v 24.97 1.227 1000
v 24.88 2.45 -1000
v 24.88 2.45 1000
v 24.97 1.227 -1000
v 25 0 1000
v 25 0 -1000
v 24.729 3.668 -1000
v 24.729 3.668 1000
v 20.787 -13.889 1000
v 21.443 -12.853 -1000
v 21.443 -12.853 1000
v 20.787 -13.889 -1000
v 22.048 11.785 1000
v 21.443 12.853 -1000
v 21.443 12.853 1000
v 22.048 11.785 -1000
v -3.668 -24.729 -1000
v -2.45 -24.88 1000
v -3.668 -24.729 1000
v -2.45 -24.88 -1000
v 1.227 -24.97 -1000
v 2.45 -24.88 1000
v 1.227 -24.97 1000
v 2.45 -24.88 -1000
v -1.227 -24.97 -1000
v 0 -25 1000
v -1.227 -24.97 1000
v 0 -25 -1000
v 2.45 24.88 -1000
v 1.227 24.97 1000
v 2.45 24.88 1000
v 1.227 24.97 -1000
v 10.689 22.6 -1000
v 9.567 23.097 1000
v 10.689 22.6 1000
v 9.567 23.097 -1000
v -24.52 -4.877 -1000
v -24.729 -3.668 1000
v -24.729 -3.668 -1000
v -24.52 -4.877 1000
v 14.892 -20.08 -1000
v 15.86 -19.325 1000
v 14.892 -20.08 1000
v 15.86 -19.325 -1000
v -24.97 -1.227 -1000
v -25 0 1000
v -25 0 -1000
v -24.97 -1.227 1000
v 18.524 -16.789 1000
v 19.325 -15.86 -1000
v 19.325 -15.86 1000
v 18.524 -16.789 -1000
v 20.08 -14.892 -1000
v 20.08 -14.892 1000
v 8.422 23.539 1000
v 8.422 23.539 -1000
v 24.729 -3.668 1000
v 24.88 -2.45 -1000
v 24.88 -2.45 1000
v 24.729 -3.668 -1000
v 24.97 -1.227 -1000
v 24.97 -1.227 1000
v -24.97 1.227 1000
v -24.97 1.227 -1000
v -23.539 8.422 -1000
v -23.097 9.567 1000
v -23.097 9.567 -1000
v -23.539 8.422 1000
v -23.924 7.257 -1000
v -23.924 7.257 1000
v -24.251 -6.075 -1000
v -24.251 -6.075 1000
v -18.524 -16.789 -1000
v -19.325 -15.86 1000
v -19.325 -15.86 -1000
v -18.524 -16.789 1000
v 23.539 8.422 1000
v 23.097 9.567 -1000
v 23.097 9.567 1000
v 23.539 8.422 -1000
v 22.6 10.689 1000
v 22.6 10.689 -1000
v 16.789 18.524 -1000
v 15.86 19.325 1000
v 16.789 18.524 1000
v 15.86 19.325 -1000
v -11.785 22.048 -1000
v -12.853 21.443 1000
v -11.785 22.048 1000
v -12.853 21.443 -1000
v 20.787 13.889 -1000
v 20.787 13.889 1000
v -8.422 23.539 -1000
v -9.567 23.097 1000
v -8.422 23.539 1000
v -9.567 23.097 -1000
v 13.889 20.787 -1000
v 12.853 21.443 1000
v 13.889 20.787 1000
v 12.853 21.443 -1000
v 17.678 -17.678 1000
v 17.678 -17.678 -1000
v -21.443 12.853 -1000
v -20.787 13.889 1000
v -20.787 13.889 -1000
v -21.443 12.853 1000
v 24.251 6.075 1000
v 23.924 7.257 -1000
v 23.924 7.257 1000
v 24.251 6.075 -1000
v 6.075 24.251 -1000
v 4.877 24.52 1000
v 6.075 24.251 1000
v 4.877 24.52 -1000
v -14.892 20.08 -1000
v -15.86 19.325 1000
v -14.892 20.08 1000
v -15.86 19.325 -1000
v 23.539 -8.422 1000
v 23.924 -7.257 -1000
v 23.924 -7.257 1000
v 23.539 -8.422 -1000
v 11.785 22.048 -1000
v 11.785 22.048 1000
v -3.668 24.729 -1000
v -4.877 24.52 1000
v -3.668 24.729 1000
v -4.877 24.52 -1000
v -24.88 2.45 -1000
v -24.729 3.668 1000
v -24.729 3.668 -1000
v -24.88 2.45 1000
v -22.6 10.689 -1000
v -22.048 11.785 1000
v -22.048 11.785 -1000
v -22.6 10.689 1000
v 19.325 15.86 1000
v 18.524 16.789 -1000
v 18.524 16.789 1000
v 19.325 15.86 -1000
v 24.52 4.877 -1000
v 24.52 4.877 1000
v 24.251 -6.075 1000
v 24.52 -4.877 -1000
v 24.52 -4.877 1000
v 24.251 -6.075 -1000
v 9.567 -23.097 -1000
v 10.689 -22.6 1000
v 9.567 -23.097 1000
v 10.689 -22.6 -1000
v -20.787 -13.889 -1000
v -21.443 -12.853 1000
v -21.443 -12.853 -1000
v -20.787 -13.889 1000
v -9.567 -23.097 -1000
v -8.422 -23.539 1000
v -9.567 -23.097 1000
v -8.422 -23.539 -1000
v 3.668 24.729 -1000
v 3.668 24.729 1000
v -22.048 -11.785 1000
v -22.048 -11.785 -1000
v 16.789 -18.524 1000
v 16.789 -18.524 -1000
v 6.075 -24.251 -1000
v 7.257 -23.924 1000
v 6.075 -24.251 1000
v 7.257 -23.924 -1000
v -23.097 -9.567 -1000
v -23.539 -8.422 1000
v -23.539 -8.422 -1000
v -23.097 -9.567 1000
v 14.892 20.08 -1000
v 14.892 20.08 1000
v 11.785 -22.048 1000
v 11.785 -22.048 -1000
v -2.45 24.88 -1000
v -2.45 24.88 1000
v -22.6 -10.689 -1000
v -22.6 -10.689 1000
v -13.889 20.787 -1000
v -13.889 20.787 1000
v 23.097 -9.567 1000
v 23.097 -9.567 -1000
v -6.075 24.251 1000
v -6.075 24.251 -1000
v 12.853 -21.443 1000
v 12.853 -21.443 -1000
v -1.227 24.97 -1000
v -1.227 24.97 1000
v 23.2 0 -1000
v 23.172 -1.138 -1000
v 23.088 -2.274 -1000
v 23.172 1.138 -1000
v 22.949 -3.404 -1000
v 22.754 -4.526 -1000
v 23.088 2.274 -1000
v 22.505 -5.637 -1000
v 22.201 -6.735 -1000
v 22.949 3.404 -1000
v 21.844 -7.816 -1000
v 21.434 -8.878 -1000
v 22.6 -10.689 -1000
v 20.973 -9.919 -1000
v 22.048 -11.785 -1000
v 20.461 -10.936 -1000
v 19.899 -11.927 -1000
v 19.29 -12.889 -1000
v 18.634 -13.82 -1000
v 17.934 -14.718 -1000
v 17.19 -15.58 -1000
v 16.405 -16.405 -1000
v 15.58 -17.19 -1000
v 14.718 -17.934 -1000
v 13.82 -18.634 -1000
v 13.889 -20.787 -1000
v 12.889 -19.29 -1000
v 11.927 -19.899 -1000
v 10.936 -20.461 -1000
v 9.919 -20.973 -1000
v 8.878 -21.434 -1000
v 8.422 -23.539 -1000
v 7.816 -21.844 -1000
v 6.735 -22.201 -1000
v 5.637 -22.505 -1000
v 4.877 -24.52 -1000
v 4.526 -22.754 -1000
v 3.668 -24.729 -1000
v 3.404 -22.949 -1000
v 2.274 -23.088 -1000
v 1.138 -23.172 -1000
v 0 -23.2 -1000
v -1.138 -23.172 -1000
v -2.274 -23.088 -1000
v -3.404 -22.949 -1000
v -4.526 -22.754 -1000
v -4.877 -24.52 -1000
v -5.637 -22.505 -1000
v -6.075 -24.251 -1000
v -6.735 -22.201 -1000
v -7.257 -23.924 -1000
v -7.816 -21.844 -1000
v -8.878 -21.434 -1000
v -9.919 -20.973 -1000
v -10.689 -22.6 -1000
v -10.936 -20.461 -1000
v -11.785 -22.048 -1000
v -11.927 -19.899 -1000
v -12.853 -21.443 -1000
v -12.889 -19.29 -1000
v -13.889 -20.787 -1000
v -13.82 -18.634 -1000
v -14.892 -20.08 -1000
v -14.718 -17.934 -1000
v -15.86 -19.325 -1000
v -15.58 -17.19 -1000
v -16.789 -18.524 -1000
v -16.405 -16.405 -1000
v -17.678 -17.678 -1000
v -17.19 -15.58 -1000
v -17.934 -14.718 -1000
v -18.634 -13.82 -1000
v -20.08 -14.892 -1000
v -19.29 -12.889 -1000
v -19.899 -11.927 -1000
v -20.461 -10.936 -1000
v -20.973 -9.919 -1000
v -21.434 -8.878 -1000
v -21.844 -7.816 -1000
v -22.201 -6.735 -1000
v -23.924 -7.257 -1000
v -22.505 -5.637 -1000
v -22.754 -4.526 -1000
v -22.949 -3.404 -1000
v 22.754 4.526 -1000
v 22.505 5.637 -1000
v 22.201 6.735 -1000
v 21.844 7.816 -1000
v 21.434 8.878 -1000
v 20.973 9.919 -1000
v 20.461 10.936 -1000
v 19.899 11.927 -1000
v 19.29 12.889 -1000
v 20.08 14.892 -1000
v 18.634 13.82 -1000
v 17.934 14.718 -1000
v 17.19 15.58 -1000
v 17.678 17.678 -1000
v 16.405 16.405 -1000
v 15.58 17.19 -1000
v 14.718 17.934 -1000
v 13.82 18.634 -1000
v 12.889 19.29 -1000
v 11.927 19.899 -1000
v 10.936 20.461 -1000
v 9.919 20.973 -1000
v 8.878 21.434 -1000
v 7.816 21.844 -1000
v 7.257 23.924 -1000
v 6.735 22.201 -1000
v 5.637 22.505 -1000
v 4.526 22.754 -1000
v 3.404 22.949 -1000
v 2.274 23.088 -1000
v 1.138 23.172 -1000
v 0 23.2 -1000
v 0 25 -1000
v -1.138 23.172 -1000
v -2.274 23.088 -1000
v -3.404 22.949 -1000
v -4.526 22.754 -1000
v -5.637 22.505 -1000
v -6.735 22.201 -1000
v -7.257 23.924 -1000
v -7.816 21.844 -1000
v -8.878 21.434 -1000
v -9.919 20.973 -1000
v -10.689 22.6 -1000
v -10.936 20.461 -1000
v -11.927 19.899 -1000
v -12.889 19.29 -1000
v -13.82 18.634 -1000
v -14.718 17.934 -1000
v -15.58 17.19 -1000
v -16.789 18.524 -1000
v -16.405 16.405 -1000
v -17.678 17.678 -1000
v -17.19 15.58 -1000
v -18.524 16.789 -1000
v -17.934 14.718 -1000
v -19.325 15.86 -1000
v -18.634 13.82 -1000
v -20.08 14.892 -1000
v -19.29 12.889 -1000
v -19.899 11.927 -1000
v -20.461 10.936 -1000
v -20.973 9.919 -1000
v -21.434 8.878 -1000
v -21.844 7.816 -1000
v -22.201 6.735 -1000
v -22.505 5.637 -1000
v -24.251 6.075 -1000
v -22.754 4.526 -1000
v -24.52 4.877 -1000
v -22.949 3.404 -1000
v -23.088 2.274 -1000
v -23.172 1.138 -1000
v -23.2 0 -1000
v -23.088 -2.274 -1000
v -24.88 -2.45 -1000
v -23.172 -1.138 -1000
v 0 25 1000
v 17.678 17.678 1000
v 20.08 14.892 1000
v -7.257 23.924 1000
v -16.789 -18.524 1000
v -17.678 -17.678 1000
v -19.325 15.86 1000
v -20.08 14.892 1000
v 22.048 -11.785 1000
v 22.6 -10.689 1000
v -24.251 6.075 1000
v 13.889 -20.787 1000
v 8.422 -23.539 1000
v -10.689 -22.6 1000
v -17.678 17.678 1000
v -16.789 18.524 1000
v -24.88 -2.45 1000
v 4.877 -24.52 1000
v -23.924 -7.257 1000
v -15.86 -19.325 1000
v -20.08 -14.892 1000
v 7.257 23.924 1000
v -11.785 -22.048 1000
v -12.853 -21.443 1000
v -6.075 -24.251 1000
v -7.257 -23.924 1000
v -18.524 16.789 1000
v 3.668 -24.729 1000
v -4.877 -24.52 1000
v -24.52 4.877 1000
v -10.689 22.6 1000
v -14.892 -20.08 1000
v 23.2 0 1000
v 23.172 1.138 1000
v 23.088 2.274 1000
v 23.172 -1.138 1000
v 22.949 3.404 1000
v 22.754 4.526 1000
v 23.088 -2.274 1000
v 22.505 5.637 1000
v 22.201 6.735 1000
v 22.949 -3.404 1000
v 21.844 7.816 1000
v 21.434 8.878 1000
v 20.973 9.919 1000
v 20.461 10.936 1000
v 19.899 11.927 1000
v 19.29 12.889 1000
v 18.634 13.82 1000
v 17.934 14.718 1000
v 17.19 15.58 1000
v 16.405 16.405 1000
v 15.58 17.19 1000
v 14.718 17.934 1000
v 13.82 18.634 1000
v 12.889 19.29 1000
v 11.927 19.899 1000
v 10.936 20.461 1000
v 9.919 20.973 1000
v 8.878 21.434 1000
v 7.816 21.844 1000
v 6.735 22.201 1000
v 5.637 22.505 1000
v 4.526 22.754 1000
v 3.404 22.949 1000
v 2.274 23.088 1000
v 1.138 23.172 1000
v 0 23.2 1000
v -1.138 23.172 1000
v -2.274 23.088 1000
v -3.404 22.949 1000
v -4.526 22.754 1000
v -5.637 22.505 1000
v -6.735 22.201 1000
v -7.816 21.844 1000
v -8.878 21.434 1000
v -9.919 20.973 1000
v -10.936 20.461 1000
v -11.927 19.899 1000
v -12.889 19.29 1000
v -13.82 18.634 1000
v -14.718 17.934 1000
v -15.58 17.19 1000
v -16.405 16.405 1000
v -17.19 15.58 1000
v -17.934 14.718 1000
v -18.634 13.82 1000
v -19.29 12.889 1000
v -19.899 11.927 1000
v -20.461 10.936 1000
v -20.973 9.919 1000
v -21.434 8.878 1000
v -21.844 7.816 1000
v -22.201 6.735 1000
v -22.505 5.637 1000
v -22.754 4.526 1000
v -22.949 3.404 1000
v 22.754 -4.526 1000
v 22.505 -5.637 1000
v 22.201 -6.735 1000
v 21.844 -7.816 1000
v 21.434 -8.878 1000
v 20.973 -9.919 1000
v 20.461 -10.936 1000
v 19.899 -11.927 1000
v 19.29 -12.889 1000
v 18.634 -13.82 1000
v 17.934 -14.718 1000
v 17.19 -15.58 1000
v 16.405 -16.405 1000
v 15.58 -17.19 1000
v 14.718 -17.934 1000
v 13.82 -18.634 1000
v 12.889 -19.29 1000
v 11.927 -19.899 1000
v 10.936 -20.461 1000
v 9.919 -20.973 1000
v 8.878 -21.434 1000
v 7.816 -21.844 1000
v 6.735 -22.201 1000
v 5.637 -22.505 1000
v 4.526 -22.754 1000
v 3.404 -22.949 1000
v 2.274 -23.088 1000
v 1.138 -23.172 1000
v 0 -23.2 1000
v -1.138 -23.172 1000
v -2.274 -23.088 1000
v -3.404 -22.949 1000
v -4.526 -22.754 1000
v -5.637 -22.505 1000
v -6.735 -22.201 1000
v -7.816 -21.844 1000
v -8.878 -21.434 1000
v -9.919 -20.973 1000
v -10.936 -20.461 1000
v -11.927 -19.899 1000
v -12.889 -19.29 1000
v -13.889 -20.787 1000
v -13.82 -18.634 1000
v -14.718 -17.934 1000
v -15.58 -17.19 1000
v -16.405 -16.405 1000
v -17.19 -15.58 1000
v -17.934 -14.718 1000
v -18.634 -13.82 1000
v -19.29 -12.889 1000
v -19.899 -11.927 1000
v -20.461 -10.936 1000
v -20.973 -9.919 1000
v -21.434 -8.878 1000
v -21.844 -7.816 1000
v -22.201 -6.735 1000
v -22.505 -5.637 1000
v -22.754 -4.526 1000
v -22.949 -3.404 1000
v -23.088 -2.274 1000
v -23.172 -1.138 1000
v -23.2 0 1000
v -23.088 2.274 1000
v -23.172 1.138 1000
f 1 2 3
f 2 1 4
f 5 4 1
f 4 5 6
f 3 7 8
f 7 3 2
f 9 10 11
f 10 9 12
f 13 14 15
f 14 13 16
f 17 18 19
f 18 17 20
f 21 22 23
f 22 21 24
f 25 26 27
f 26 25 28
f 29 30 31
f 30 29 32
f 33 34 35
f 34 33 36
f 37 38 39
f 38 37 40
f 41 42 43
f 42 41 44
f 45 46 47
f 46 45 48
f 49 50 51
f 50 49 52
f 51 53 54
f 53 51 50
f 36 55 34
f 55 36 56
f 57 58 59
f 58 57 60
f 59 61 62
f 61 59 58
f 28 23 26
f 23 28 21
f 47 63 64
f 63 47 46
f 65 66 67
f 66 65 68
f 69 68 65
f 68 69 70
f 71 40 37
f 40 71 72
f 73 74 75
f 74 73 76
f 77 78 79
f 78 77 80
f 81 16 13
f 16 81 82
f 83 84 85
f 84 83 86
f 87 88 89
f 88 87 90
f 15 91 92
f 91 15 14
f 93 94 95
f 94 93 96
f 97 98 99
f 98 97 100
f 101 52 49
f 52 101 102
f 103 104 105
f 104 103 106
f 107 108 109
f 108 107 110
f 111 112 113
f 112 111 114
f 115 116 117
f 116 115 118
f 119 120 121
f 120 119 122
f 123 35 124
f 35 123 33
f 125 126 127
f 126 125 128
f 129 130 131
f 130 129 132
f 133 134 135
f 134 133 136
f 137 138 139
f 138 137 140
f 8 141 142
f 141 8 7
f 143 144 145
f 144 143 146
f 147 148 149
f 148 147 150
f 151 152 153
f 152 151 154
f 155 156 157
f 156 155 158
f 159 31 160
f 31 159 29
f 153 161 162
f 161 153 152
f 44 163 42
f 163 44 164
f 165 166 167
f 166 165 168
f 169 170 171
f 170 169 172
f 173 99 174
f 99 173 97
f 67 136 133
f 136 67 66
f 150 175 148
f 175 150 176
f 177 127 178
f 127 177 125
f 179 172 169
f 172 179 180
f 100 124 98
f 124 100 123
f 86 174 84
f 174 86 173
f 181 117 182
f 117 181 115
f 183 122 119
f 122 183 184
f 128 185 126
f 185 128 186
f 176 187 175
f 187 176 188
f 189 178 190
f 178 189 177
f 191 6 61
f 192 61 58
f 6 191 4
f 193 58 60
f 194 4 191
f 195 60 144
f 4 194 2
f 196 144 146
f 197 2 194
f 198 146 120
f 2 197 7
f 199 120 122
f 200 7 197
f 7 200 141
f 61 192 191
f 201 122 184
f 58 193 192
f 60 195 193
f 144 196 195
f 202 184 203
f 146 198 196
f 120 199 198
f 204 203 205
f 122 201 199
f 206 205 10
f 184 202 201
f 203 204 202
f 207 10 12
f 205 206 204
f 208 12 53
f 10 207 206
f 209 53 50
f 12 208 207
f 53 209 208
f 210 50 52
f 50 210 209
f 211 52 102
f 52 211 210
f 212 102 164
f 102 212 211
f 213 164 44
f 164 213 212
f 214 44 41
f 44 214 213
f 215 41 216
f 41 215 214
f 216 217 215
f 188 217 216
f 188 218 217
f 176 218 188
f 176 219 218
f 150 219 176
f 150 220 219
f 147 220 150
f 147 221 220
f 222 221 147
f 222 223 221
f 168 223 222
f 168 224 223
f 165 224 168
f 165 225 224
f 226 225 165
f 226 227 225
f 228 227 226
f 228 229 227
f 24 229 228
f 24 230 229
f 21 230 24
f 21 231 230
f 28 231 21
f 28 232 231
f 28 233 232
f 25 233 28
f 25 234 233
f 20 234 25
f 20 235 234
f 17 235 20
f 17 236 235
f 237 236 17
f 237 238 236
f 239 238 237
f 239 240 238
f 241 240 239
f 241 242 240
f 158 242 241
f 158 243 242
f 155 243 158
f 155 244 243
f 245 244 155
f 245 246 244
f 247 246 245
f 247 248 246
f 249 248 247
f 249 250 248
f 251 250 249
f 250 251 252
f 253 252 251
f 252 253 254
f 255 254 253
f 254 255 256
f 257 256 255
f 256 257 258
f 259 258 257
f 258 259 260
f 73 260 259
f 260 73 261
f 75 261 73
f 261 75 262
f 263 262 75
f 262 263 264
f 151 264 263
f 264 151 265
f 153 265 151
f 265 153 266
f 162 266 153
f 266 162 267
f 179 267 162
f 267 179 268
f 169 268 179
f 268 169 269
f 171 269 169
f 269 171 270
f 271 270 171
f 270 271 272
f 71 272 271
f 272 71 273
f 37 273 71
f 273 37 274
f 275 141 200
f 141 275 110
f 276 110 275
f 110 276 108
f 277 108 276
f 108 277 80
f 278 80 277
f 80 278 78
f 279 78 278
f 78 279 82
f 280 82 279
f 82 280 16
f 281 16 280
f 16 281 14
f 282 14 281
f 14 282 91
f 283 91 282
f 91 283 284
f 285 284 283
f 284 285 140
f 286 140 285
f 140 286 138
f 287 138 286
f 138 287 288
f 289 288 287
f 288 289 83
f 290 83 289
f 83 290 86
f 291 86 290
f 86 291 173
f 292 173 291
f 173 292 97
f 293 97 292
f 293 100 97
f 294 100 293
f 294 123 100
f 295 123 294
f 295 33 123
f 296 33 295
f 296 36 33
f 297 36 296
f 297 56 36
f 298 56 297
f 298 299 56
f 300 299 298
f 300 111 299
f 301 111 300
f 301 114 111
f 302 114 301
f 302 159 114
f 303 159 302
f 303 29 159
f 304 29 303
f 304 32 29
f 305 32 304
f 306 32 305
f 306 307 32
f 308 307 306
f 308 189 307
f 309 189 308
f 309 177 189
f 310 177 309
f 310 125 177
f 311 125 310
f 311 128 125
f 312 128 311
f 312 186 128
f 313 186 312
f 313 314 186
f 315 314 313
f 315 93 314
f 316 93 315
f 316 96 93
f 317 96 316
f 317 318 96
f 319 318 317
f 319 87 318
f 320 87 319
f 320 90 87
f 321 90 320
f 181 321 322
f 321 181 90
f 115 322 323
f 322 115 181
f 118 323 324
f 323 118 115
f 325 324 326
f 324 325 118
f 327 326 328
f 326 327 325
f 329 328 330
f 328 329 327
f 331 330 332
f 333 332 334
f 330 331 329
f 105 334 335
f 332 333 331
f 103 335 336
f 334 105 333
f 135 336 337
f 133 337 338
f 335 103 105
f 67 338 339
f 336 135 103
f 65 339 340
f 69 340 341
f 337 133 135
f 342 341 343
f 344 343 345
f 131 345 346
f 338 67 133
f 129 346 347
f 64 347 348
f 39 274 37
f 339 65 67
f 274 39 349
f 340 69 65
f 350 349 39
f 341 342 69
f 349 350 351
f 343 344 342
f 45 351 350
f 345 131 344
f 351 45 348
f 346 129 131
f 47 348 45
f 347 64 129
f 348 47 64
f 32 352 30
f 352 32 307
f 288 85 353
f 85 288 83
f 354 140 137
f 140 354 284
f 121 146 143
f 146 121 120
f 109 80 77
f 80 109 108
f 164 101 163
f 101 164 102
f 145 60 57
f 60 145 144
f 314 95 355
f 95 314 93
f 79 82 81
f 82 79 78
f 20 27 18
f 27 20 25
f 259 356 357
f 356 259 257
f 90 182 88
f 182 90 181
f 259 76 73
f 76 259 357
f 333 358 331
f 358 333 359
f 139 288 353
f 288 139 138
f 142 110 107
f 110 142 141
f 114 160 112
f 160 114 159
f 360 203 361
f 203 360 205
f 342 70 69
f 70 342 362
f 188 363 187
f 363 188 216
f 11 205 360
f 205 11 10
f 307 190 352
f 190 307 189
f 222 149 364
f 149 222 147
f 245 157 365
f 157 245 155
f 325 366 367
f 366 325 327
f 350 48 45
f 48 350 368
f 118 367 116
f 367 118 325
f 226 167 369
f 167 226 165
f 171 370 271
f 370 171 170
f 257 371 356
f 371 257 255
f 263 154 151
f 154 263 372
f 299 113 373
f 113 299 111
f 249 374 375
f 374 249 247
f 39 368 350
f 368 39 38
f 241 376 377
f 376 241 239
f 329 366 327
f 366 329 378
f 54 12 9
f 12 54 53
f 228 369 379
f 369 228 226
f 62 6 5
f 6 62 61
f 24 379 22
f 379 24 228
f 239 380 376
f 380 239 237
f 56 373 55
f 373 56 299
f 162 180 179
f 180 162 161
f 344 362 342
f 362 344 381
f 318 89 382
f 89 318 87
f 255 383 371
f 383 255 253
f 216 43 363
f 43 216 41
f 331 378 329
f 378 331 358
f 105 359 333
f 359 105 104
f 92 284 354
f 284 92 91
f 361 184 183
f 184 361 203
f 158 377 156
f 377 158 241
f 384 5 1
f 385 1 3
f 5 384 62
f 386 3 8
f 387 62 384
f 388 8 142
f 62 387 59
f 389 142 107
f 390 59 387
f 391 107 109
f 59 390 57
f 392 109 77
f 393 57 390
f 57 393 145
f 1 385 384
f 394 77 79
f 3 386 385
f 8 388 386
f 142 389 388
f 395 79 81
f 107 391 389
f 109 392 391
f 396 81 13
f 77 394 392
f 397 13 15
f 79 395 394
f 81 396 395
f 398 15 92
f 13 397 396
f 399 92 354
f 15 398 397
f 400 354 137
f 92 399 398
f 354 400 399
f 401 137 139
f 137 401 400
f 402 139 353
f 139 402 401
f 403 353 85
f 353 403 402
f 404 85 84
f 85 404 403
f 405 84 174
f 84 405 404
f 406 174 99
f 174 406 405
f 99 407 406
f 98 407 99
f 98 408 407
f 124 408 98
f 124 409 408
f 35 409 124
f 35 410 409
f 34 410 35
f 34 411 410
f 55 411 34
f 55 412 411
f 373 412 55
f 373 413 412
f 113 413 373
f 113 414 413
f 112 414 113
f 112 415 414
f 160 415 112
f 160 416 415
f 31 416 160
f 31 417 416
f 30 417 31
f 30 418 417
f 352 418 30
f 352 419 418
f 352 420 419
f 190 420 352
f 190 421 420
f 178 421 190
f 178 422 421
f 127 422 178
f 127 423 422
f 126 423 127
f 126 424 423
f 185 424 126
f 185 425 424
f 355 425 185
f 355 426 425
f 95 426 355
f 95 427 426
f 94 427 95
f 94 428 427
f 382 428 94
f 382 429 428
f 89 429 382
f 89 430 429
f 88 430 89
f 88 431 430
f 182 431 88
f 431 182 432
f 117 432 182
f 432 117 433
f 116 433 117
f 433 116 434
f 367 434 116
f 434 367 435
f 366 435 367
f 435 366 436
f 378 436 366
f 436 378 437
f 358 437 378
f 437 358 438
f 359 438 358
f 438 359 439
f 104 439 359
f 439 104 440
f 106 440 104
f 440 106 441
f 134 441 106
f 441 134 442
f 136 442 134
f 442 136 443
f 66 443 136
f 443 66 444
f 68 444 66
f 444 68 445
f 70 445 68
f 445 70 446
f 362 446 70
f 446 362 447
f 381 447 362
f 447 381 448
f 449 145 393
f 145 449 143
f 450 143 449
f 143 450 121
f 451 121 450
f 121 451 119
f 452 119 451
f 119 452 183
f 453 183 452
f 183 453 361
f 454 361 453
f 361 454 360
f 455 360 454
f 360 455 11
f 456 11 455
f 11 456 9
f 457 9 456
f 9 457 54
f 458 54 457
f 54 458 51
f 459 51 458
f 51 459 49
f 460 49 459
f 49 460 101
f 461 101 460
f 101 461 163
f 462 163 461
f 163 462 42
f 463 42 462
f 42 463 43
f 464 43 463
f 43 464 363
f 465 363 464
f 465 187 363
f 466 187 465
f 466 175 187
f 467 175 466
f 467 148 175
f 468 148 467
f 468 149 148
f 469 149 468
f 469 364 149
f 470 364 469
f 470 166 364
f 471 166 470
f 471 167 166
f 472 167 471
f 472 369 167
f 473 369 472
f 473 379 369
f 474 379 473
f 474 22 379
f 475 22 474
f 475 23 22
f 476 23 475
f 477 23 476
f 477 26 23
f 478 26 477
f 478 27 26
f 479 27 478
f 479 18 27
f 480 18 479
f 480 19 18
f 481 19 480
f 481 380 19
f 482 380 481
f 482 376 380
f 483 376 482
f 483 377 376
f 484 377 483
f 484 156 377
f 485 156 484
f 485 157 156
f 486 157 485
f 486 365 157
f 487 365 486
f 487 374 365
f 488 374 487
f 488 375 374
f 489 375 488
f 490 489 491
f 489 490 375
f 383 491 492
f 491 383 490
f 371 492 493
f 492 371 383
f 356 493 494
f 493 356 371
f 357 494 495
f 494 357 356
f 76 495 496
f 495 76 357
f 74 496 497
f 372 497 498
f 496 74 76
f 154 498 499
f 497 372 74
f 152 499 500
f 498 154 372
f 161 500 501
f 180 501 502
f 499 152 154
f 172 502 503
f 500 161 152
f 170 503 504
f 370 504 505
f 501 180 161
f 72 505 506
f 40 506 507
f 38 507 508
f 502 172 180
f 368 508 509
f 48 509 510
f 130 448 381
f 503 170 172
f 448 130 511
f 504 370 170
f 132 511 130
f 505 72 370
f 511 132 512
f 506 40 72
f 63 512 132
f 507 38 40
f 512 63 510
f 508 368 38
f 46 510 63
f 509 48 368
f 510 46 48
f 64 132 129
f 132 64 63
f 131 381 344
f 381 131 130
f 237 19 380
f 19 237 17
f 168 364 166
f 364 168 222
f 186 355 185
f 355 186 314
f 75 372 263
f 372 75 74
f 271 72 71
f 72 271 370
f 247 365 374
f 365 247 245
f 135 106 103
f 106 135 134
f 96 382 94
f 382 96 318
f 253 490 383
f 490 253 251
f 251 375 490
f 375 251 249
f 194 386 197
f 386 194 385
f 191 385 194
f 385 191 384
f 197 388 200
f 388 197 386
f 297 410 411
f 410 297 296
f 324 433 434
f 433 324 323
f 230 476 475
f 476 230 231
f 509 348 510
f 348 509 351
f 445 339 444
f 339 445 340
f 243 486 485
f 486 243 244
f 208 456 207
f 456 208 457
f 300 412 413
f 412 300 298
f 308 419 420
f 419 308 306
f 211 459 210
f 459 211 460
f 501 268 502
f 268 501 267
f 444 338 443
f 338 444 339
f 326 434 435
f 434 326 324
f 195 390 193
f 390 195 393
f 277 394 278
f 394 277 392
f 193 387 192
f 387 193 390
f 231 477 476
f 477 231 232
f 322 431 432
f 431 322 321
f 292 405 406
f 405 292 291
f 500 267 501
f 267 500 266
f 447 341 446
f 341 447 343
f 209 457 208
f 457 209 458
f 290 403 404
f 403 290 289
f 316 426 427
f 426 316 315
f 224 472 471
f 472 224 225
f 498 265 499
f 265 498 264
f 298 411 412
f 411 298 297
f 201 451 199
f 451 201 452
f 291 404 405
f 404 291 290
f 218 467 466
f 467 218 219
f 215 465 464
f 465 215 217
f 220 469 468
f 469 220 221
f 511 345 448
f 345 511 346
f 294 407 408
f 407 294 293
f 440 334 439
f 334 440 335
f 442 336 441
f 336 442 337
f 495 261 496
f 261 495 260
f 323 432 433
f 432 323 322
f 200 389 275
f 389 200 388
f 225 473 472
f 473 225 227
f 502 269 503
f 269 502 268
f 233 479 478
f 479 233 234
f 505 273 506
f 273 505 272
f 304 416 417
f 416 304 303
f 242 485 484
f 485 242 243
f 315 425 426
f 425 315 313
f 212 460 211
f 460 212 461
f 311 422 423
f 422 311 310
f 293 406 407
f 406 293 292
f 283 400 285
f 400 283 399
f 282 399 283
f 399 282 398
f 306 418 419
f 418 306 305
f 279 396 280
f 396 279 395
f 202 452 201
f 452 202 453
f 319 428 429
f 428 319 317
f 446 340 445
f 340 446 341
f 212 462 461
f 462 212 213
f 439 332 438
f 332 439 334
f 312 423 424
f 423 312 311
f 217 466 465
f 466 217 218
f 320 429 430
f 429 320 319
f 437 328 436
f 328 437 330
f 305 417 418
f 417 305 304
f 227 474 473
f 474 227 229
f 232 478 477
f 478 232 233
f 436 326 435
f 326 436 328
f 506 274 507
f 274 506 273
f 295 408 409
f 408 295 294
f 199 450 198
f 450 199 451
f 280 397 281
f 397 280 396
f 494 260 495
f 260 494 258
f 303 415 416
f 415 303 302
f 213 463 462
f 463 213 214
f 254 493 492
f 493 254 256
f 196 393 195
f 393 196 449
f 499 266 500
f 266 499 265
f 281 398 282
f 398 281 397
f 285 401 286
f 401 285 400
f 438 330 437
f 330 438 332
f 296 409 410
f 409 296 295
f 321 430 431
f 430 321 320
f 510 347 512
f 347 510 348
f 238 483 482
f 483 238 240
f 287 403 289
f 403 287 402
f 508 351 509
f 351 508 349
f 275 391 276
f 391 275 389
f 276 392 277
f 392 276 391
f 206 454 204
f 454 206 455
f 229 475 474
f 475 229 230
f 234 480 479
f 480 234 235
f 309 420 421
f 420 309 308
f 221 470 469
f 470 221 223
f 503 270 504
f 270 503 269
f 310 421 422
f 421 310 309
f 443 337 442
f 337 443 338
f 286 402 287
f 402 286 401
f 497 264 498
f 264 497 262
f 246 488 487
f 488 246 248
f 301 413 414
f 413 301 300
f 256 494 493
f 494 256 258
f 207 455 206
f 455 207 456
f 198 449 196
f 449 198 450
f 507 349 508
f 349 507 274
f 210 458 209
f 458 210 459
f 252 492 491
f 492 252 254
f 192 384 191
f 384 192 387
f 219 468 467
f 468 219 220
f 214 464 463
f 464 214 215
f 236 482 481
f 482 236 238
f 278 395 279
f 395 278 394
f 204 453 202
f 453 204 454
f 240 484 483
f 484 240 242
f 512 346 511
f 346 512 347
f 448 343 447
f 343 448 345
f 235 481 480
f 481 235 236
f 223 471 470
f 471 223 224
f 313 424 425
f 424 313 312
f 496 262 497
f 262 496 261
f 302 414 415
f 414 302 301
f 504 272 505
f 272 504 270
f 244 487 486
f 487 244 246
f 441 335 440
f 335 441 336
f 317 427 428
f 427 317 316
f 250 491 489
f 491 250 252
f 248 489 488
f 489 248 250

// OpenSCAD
$fn=128;

module ht_pipe(od=50, length=2000, wall=1.8) {
    difference() {
        cylinder(h=length, d=od, center=true);
        cylinder(h=length+2, d=od-2*wall, center=true);
    }
}

ht_pipe(od=50, length=2000, wall=1.8);
